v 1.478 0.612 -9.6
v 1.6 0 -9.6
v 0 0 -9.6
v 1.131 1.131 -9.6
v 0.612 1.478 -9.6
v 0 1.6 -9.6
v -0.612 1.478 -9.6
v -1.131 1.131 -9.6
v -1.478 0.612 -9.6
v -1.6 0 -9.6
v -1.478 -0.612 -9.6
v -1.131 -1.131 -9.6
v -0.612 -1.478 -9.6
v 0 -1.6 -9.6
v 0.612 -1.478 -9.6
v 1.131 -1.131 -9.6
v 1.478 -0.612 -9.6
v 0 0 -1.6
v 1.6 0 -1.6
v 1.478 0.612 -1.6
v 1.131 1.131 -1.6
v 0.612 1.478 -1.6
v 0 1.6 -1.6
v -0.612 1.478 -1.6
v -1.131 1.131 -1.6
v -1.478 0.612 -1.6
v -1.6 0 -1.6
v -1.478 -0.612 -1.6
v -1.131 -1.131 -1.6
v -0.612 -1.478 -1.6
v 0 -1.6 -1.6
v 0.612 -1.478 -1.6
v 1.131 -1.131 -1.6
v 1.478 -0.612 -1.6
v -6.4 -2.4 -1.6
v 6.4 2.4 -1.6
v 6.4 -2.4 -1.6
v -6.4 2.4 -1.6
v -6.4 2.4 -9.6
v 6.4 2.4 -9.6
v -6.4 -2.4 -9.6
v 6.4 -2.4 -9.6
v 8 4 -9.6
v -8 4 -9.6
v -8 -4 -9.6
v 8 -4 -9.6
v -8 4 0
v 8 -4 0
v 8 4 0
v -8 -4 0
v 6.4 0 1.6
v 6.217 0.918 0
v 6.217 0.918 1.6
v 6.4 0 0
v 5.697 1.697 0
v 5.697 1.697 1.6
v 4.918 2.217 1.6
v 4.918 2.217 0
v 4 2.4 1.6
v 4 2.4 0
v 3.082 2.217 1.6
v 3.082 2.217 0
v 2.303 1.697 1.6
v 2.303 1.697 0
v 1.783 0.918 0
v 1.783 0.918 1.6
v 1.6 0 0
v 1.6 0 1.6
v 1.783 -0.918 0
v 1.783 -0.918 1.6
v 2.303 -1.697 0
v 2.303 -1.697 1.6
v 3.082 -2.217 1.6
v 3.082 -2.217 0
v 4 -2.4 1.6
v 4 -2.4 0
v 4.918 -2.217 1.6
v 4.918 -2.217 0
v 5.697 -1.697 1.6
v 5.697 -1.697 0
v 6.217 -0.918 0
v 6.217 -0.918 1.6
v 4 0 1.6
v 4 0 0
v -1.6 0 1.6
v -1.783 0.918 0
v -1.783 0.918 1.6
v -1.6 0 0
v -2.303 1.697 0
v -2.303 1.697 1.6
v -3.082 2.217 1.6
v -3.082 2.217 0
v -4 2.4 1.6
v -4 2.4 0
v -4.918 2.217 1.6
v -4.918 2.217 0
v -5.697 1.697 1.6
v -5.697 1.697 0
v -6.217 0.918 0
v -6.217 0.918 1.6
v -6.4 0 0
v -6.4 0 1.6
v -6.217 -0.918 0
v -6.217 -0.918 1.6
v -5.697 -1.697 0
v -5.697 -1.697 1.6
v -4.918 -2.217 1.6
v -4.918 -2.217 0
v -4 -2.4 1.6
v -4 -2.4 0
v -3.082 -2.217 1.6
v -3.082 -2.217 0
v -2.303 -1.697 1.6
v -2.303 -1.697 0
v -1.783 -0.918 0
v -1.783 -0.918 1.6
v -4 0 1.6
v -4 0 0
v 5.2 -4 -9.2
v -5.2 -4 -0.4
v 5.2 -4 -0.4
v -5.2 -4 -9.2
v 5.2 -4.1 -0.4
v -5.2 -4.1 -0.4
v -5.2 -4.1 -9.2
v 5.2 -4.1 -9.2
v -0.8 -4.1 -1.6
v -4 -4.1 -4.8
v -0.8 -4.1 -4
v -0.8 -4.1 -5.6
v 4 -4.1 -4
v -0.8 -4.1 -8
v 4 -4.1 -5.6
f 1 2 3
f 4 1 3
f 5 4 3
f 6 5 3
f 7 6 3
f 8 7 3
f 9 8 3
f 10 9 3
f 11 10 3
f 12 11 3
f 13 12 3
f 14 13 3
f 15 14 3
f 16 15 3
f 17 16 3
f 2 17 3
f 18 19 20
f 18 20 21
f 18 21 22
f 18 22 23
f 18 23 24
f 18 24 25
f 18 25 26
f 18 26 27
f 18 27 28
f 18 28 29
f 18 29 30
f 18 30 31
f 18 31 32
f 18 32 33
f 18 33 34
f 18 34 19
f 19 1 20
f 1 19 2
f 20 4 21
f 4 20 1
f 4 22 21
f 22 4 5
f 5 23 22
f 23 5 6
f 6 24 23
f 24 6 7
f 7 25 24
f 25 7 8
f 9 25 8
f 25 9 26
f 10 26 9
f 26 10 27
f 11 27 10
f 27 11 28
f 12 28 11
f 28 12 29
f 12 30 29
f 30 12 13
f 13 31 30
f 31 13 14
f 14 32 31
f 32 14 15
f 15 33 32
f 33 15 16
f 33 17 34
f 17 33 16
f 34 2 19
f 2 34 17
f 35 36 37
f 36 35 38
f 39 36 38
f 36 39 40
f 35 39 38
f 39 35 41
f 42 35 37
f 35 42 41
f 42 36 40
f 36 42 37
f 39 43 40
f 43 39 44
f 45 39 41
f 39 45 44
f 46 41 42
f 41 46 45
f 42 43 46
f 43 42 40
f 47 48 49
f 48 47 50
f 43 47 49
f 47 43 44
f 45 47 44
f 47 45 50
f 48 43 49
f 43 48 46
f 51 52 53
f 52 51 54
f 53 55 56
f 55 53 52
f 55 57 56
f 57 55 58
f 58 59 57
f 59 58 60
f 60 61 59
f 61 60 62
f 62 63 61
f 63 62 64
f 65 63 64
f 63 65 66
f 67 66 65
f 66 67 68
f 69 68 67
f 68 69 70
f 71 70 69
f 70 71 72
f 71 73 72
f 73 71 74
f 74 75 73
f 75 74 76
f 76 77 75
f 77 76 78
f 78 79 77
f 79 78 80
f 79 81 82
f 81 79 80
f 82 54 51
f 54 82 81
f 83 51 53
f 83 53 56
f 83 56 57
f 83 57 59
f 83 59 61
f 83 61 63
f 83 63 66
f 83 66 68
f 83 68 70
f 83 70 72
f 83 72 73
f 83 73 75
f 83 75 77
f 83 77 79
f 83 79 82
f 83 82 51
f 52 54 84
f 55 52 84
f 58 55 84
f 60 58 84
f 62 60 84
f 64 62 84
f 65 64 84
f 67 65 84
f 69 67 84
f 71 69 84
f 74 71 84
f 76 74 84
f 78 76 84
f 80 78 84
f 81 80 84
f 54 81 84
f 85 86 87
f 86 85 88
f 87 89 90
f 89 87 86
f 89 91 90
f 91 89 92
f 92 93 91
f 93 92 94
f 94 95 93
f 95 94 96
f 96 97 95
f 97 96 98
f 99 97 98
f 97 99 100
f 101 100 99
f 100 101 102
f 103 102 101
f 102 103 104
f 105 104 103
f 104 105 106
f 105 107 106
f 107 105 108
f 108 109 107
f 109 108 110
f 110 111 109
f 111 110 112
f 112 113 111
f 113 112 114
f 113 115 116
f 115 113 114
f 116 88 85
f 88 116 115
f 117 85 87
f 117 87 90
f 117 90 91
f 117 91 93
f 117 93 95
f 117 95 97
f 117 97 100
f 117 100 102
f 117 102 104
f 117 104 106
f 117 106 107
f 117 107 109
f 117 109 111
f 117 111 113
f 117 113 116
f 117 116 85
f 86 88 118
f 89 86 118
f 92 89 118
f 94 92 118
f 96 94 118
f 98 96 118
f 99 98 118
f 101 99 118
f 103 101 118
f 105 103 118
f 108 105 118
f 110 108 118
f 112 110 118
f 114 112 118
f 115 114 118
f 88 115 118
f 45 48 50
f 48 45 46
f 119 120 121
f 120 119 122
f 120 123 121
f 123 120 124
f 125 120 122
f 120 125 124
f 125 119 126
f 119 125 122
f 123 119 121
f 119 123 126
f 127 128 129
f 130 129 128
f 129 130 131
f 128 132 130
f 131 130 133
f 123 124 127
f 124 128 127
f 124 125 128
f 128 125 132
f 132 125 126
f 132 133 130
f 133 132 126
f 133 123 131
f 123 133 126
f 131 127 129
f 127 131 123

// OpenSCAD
// file: ../p/4-4edge.scad
use <../lib.scad>
function ldraw_lib__4_4edge() = [
// 0 Circle 1.0
// 0 Name: 4-4edge.dat
// 0 Author: James Jessiman
// 0 !LDRAW_ORG Primitive UPDATE 2017-01
// 0 !LICENSE Licensed under CC BY 2.0 and CC BY 4.0 : see CAreadme.txt
// 
// 0 BFC CERTIFY CCW
  [0,"BFC","CERTIFY"],
  [0,"BFC","CCW"],
// 
// 0 !HISTORY 1998-12-15 [PTadmin] Official Update 1998-10
// 0 !HISTORY 2005-12-28 [PTadmin] Official Update 2005-01
// 0 !HISTORY 2007-06-24 [PTadmin] Header formatted for Contributor Agreement
// 0 !HISTORY 2008-07-01 [PTadmin] Official Update 2008-01
// 0 !HISTORY 2017-01-15 [Steffen] BFCed
// 0 !HISTORY 2017-12-30 [PTadmin] Official Update 2017-01
// 
// 
// 2 24 1 0 0 0.9239 0 0.3827
  [2,24,1,0,0,0.9239,0,0.3827],
// 2 24 0.9239 0 0.3827 0.7071 0 0.7071
  [2,24,0.9239,0,0.3827,0.7071,0,0.7071],
// 2 24 0.7071 0 0.7071 0.3827 0 0.9239
  [2,24,0.7071,0,0.7071,0.3827,0,0.9239],
// 2 24 0.3827 0 0.9239 0 0 1
  [2,24,0.3827,0,0.9239,0,0,1],
// 2 24 0 0 1 -0.3827 0 0.9239
  [2,24,0,0,1,-0.3827,0,0.9239],
// 2 24 -0.3827 0 0.9239 -0.7071 0 0.7071
  [2,24,-0.3827,0,0.9239,-0.7071,0,0.7071],
// 2 24 -0.7071 0 0.7071 -0.9239 0 0.3827
  [2,24,-0.7071,0,0.7071,-0.9239,0,0.3827],
// 2 24 -0.9239 0 0.3827 -1 0 -0
  [2,24,-0.9239,0,0.3827,-1,0,-0],
// 2 24 -1 0 -0 -0.9239 0 -0.3827
  [2,24,-1,0,-0,-0.9239,0,-0.3827],
// 2 24 -0.9239 0 -0.3827 -0.7071 0 -0.7071
  [2,24,-0.9239,0,-0.3827,-0.7071,0,-0.7071],
// 2 24 -0.7071 0 -0.7071 -0.3827 0 -0.9239
  [2,24,-0.7071,0,-0.7071,-0.3827,0,-0.9239],
// 2 24 -0.3827 0 -0.9239 0 0 -1
  [2,24,-0.3827,0,-0.9239,0,0,-1],
// 2 24 0 0 -1 0.3827 0 -0.9239
  [2,24,0,0,-1,0.3827,0,-0.9239],
// 2 24 0.3827 0 -0.9239 0.7071 0 -0.7071
  [2,24,0.3827,0,-0.9239,0.7071,0,-0.7071],
// 2 24 0.7071 0 -0.7071 0.9239 0 -0.3827
  [2,24,0.7071,0,-0.7071,0.9239,0,-0.3827],
// 2 24 0.9239 0 -0.3827 1 0 0
  [2,24,0.9239,0,-0.3827,1,0,0],
];
module ldraw_lib__4_4edge(step=0, col=false, unit=2/5, alt=false, line=0.2, solid=!$preview)
    makepoly(ldraw_lib__4_4edge(), step=step, col=col, unit=unit, alt=alt, line=line, solid=solid);
ldraw_lib__4_4edge(line=0.2);
// file: ../p/4-4disc.scad
use <../lib.scad>
function ldraw_lib__4_4disc() = [
// 0 Disc 1.0
// 0 Name: 4-4disc.dat
// 0 Author: James Jessiman
// 0 !LDRAW_ORG Primitive UPDATE 2002-02
// 0 !LICENSE Licensed under CC BY 2.0 and CC BY 4.0 : see CAreadme.txt
// 
// 0 BFC CERTIFY CCW
  [0,"BFC","CERTIFY"],
  [0,"BFC","CCW"],
// 
// 0 !HISTORY 1998-12-15 [PTadmin] Official Update 1998-10
// 0 !HISTORY 2002-03-23 [sbliss] Added BFC statement
// 0 !HISTORY 2002-04-25 [PTadmin] Official Update 2002-02
// 0 !HISTORY 2007-06-24 [PTadmin] Header formatted for Contributor Agreement
// 0 !HISTORY 2008-07-01 [PTadmin] Official Update 2008-01
// 
// 
// 3 16 0 0 0 1 0 0 0.9239 0 0.3827
  [3,16,0,0,0,1,0,0,0.9239,0,0.3827],
// 3 16 0 0 0 0.9239 0 0.3827 0.7071 0 0.7071
  [3,16,0,0,0,0.9239,0,0.3827,0.7071,0,0.7071],
// 3 16 0 0 0 0.7071 0 0.7071 0.3827 0 0.9239
  [3,16,0,0,0,0.7071,0,0.7071,0.3827,0,0.9239],
// 3 16 0 0 0 0.3827 0 0.9239 0 0 1
  [3,16,0,0,0,0.3827,0,0.9239,0,0,1],
// 3 16 0 0 0 0 0 1 -0.3827 0 0.9239
  [3,16,0,0,0,0,0,1,-0.3827,0,0.9239],
// 3 16 0 0 0 -0.3827 0 0.9239 -0.7071 0 0.7071
  [3,16,0,0,0,-0.3827,0,0.9239,-0.7071,0,0.7071],
// 3 16 0 0 0 -0.7071 0 0.7071 -0.9239 0 0.3827
  [3,16,0,0,0,-0.7071,0,0.7071,-0.9239,0,0.3827],
// 3 16 0 0 0 -0.9239 0 0.3827 -1 0 -0
  [3,16,0,0,0,-0.9239,0,0.3827,-1,0,-0],
// 3 16 0 0 0 -1 0 -0 -0.9239 0 -0.3827
  [3,16,0,0,0,-1,0,-0,-0.9239,0,-0.3827],
// 3 16 0 0 0 -0.9239 0 -0.3827 -0.7071 0 -0.7071
  [3,16,0,0,0,-0.9239,0,-0.3827,-0.7071,0,-0.7071],
// 3 16 0 0 0 -0.7071 0 -0.7071 -0.3827 0 -0.9239
  [3,16,0,0,0,-0.7071,0,-0.7071,-0.3827,0,-0.9239],
// 3 16 0 0 0 -0.3827 0 -0.9239 0 0 -1
  [3,16,0,0,0,-0.3827,0,-0.9239,0,0,-1],
// 3 16 0 0 0 0 0 -1 0.3827 0 -0.9239
  [3,16,0,0,0,0,0,-1,0.3827,0,-0.9239],
// 3 16 0 0 0 0.3827 0 -0.9239 0.7071 0 -0.7071
  [3,16,0,0,0,0.3827,0,-0.9239,0.7071,0,-0.7071],
// 3 16 0 0 0 0.7071 0 -0.7071 0.9239 0 -0.3827
  [3,16,0,0,0,0.7071,0,-0.7071,0.9239,0,-0.3827],
// 3 16 0 0 0 0.9239 0 -0.3827 1 0 0
  [3,16,0,0,0,0.9239,0,-0.3827,1,0,0],
// 0
];
module ldraw_lib__4_4disc(step=0, col=false, unit=2/5, alt=false, line=0.2, solid=!$preview)
    makepoly(ldraw_lib__4_4disc(), step=step, col=col, unit=unit, alt=alt, line=line, solid=solid);
ldraw_lib__4_4disc(line=0.2);
// file: ../p/4-4cyli.scad
use <../lib.scad>
$fa=1; $fs=0.2;
function ldraw_lib__4_4cyli(realsolid=false) = [
// 0 Cylinder 1.0
// 0 Name: 4-4cyli.dat
// 0 Author: James Jessiman
// 0 !LDRAW_ORG Primitive UPDATE 2005-01
// 0 !LICENSE Licensed under CC BY 2.0 and CC BY 4.0 : see CAreadme.txt
// 
// 0 BFC CERTIFY CCW
  [0,"BFC","CERTIFY"],
  [0,"BFC","CCW"],
// 
// 0 !HISTORY 1998-12-15 [PTadmin] Official Update 1998-10
// 0 !HISTORY 2002-03-23 [sbliss] Added BFC statement; merged headers from files in distributions LDraw 0.27 and Complete.
// 0 !HISTORY 2002-04-25 [PTadmin] Official Update 2002-02
// 0 !HISTORY 2004-12-14 [guyvivan] BFC CCW
// 0 !HISTORY 2005-12-28 [PTadmin] Official Update 2005-01
// 0 !HISTORY 2007-06-24 [PTadmin] Header formatted for Contributor Agreement
// 0 !HISTORY 2008-07-01 [PTadmin] Official Update 2008-01
// 
// 
// 4 16 1 1 0 0.9239 1 0.3827 0.9239 0 0.3827 1 0 0
  [4,16,1,1,0,0.9239,1,0.3827,0.9239,0,0.3827,1,0,0],
// 5 24 1 0 0 1 1 0 0.9239 0 0.3827 0.9239 0 -0.3827
  [5,24,1,0,0,1,1,0,0.9239,0,0.3827,0.9239,0,-0.3827],
// 4 16 0.9239 1 0.3827 0.7071 1 0.7071 0.7071 0 0.7071 0.9239 0 0.3827
  [4,16,0.9239,1,0.3827,0.7071,1,0.7071,0.7071,0,0.7071,0.9239,0,0.3827],
// 5 24 0.9239 0 0.3827 0.9239 1 0.3827 0.7071 0 0.7071 1 0 0
  [5,24,0.9239,0,0.3827,0.9239,1,0.3827,0.7071,0,0.7071,1,0,0],
// 4 16 0.7071 1 0.7071 0.3827 1 0.9239 0.3827 0 0.9239 0.7071 0 0.7071
  [4,16,0.7071,1,0.7071,0.3827,1,0.9239,0.3827,0,0.9239,0.7071,0,0.7071],
// 5 24 0.7071 0 0.7071 0.7071 1 0.7071 0.3827 0 0.9239 0.9239 0 0.3827
  [5,24,0.7071,0,0.7071,0.7071,1,0.7071,0.3827,0,0.9239,0.9239,0,0.3827],
// 4 16 0.3827 1 0.9239 0 1 1 0 0 1 0.3827 0 0.9239
  [4,16,0.3827,1,0.9239,0,1,1,0,0,1,0.3827,0,0.9239],
// 5 24 0.3827 0 0.9239 0.3827 1 0.9239 0 0 1 0.7071 0 0.7071
  [5,24,0.3827,0,0.9239,0.3827,1,0.9239,0,0,1,0.7071,0,0.7071],
// 4 16 0 1 1 -0.3827 1 0.9239 -0.3827 0 0.9239 0 0 1
  [4,16,0,1,1,-0.3827,1,0.9239,-0.3827,0,0.9239,0,0,1],
// 5 24 0 0 1 0 1 1 -0.3827 0 0.9239 0.3827 0 0.9239
  [5,24,0,0,1,0,1,1,-0.3827,0,0.9239,0.3827,0,0.9239],
// 4 16 -0.3827 1 0.9239 -0.7071 1 0.7071 -0.7071 0 0.7071 -0.3827 0 0.9239
  [4,16,-0.3827,1,0.9239,-0.7071,1,0.7071,-0.7071,0,0.7071,-0.3827,0,0.9239],
// 5 24 -0.3827 0 0.9239 -0.3827 1 0.9239 -0.7071 0 0.7071 0 0 1
  [5,24,-0.3827,0,0.9239,-0.3827,1,0.9239,-0.7071,0,0.7071,0,0,1],
// 4 16 -0.7071 1 0.7071 -0.9239 1 0.3827 -0.9239 0 0.3827 -0.7071 0 0.7071
  [4,16,-0.7071,1,0.7071,-0.9239,1,0.3827,-0.9239,0,0.3827,-0.7071,0,0.7071],
// 5 24 -0.7071 0 0.7071 -0.7071 1 0.7071 -0.9239 0 0.3827 -0.3827 0 0.9239
  [5,24,-0.7071,0,0.7071,-0.7071,1,0.7071,-0.9239,0,0.3827,-0.3827,0,0.9239],
// 4 16 -0.9239 1 0.3827 -1 1 0 -1 0 0 -0.9239 0 0.3827
  [4,16,-0.9239,1,0.3827,-1,1,0,-1,0,0,-0.9239,0,0.3827],
// 5 24 -0.9239 0 0.3827 -0.9239 1 0.3827 -1 0 0 -0.7071 0 0.7071
  [5,24,-0.9239,0,0.3827,-0.9239,1,0.3827,-1,0,0,-0.7071,0,0.7071],
// 4 16 -1 1 0 -0.9239 1 -0.3827 -0.9239 0 -0.3827 -1 0 0
  [4,16,-1,1,0,-0.9239,1,-0.3827,-0.9239,0,-0.3827,-1,0,0],
// 5 24 -1 0 0 -1 1 0 -0.9239 0 -0.3827 -0.9239 0 0.3827
  [5,24,-1,0,0,-1,1,0,-0.9239,0,-0.3827,-0.9239,0,0.3827],
// 4 16 -0.9239 1 -0.3827 -0.7071 1 -0.7071 -0.7071 0 -0.7071 -0.9239 0 -0.3827
  [4,16,-0.9239,1,-0.3827,-0.7071,1,-0.7071,-0.7071,0,-0.7071,-0.9239,0,-0.3827],
// 5 24 -0.9239 0 -0.3827 -0.9239 1 -0.3827 -0.7071 0 -0.7071 -1 0 0
  [5,24,-0.9239,0,-0.3827,-0.9239,1,-0.3827,-0.7071,0,-0.7071,-1,0,0],
// 4 16 -0.7071 1 -0.7071 -0.3827 1 -0.9239 -0.3827 0 -0.9239 -0.7071 0 -0.7071
  [4,16,-0.7071,1,-0.7071,-0.3827,1,-0.9239,-0.3827,0,-0.9239,-0.7071,0,-0.7071],
// 5 24 -0.7071 0 -0.7071 -0.7071 1 -0.7071 -0.3827 0 -0.9239 -0.9239 0 -0.3827
  [5,24,-0.7071,0,-0.7071,-0.7071,1,-0.7071,-0.3827,0,-0.9239,-0.9239,0,-0.3827],
// 4 16 -0.3827 1 -0.9239 0 1 -1 0 0 -1 -0.3827 0 -0.9239
  [4,16,-0.3827,1,-0.9239,0,1,-1,0,0,-1,-0.3827,0,-0.9239],
// 5 24 -0.3827 0 -0.9239 -0.3827 1 -0.9239 0 0 -1 -0.7071 0 -0.7071
  [5,24,-0.3827,0,-0.9239,-0.3827,1,-0.9239,0,0,-1,-0.7071,0,-0.7071],
// 4 16 0 1 -1 0.3827 1 -0.9239 0.3827 0 -0.9239 0 0 -1
  [4,16,0,1,-1,0.3827,1,-0.9239,0.3827,0,-0.9239,0,0,-1],
// 5 24 0 0 -1 0 1 -1 0.3827 0 -0.9239 -0.3827 0 -0.9239
  [5,24,0,0,-1,0,1,-1,0.3827,0,-0.9239,-0.3827,0,-0.9239],
// 4 16 0.3827 1 -0.9239 0.7071 1 -0.7071 0.7071 0 -0.7071 0.3827 0 -0.9239
  [4,16,0.3827,1,-0.9239,0.7071,1,-0.7071,0.7071,0,-0.7071,0.3827,0,-0.9239],
// 5 24 0.3827 0 -0.9239 0.3827 1 -0.9239 0.7071 0 -0.7071 0 0 -1
  [5,24,0.3827,0,-0.9239,0.3827,1,-0.9239,0.7071,0,-0.7071,0,0,-1],
// 4 16 0.7071 1 -0.7071 0.9239 1 -0.3827 0.9239 0 -0.3827 0.7071 0 -0.7071
  [4,16,0.7071,1,-0.7071,0.9239,1,-0.3827,0.9239,0,-0.3827,0.7071,0,-0.7071],
// 5 24 0.7071 0 -0.7071 0.7071 1 -0.7071 0.9239 0 -0.3827 0.3827 0 -0.9239
  [5,24,0.7071,0,-0.7071,0.7071,1,-0.7071,0.9239,0,-0.3827,0.3827,0,-0.9239],
// 4 16 0.9239 1 -0.3827 1 1 0 1 0 0 0.9239 0 -0.3827
  [4,16,0.9239,1,-0.3827,1,1,0,1,0,0,0.9239,0,-0.3827],
// 5 24 0.9239 0 -0.3827 0.9239 1 -0.3827 1 0 0 0.7071 0 -0.7071
  [5,24,0.9239,0,-0.3827,0.9239,1,-0.3827,1,0,0,0.7071,0,-0.7071],
// 0
];
module ldraw_lib__4_4cyli(step=0, col=false, unit=2/5, alt=false, line=0.2, solid=!$preview)
    makepoly(ldraw_lib__4_4cyli(solid), step=step, col=col, unit=unit, alt=alt, line=line, solid=solid);
ldraw_lib__4_4cyli(line=0.2);
// file: ../p/stud3.scad
use <../lib.scad>
use <4-4cyli.scad>
use <4-4disc.scad>
use <4-4edge.scad>
function ldraw_lib__stud3() = [
// 0 Stud Tube Solid
// 0 Name: stud3.dat
// 0 Author: James Jessiman
// 0 !LDRAW_ORG Primitive UPDATE 2012-01
// 0 !LICENSE Licensed under CC BY 4.0 : see CAreadme.txt
// 
// 0 BFC CERTIFY CCW
  [0,"BFC","CERTIFY"],
  [0,"BFC","CCW"],
// 
// 0 !HISTORY 2002-04-04 [sbliss] Modified for BFC compliance
// 0 !HISTORY 2002-04-25 [PTadmin] Official Update 2002-02
// 0 !HISTORY 2007-06-24 [PTadmin] Header formatted for Contributor Agreement
// 0 !HISTORY 2008-07-01 [PTadmin] Official Update 2008-01
// 0 !HISTORY 2012-02-16 [Philo] Changed to CCW
// 0 !HISTORY 2012-03-30 [PTadmin] Official Update 2012-01
// 
// 
// 1 16 0 -4 0 4 0 0 0 1 0 0 0 4 4-4edge.dat
  [1,16,0,-4,0,4,0,0,0,1,0,0,0,4, ldraw_lib__4_4edge()],
// 1 16 0 0 0 4 0 0 0 1 0 0 0 4 4-4edge.dat
  [1,16,0,0,0,4,0,0,0,1,0,0,0,4, ldraw_lib__4_4edge()],
// 1 16 0 -4 0 4 0 0 0 1 0 0 0 4 4-4disc.dat
  [1,16,0,-4,0,4,0,0,0,1,0,0,0,4, ldraw_lib__4_4disc()],
  [-1,16,0,0,0,4,0,0,0,-1,0,0,0,4, ldraw_lib__4_4disc()],
// 1 16 0 -4 0 4 0 0 0 4 0 0 0 4 4-4cyli.dat
  [1,16,0,-4,0,4,0,0,0,4,0,0,0,4, ldraw_lib__4_4cyli()],
];
module ldraw_lib__stud3(step=0, col=false, unit=2/5, alt=false, line=0.2, solid=!$preview)
    makepoly(ldraw_lib__stud3(), step=step, col=col, unit=unit, alt=alt, line=line, solid=solid);
ldraw_lib__stud3(line=0.2);
// file: ../p/stud.scad
use <../lib.scad>
use <4-4cyli.scad>
use <4-4disc.scad>
use <4-4edge.scad>
function ldraw_lib__stud() = [
// 0 Stud
// 0 Name: stud.dat
// 0 Author: James Jessiman
// 0 !LDRAW_ORG Primitive UPDATE 2012-01
// 0 !LICENSE Licensed under CC BY 4.0 : see CAreadme.txt
// 
// 0 BFC CERTIFY CCW
  [0,"BFC","CERTIFY"],
  [0,"BFC","CCW"],
// 
// 0 !HISTORY 2002-04-04 [sbliss] Modified for BFC compliance
// 0 !HISTORY 2002-04-25 [PTadmin] Official Update 2002-02
// 0 !HISTORY 2007-06-24 [PTadmin] Header formatted for Contributor Agreement
// 0 !HISTORY 2008-07-01 [PTadmin] Official Update 2008-01
// 0 !HISTORY 2012-02-16 [Philo] Changed to CCW
// 0 !HISTORY 2012-03-30 [PTadmin] Official Update 2012-01
// 
// 
// 1 16 0 0 0 6 0 0 0 1 0 0 0 6 4-4edge.dat
  [1,16,0,0,0,6,0,0,0,1,0,0,0,6, ldraw_lib__4_4edge()],
// 1 16 0 -4 0 6 0 0 0 1 0 0 0 6 4-4edge.dat
  [1,16,0,-4,0,6,0,0,0,1,0,0,0,6, ldraw_lib__4_4edge()],
// 1 16 0 0 0 6 0 0 0 -4 0 0 0 6 4-4cyli.dat
  [1,16,0,0,0,6,0,0,0,-4,0,0,0,6, ldraw_lib__4_4cyli()],
// 1 16 0 -4 0 6 0 0 0 1 0 0 0 6 4-4disc.dat
  [1,16,0,-4,0,6,0,0,0,1,0,0,0,6, ldraw_lib__4_4disc()],
  [-1,16,0,0,0,6,0,0,0,-1,0,0,0,6, ldraw_lib__4_4disc()],
];
module ldraw_lib__stud(step=0, col=false, unit=2/5, alt=false, line=0.2, solid=!$preview)
    makepoly(ldraw_lib__stud(), step=step, col=col, unit=unit, alt=alt, line=line, solid=solid);
ldraw_lib__stud(line=0.2);
// file: ../p/box5.scad
use <../lib.scad>
function ldraw_lib__box5() = [
// 0 Box with 5 Faces and All Edges
// 0 Name: box5.dat
// 0 Author: James Jessiman
// 0 !LDRAW_ORG Primitive UPDATE 2012-01
// 0 !LICENSE Licensed under CC BY 2.0 and CC BY 4.0 : see CAreadme.txt
// 
// 0 BFC CERTIFY CCW
  [0,"BFC","CERTIFY"],
  [0,"BFC","CCW"],
// 
// 0 !HISTORY 2002-04-03 [sbliss] Modified for BFC compliance
// 0 !HISTORY 2002-04-25 [PTadmin] Official Update 2002-02
// 0 !HISTORY 2007-06-24 [PTadmin] Header formatted for Contributor Agreement
// 0 !HISTORY 2008-07-01 [PTadmin] Official Update 2008-01
// 0 !HISTORY 2012-02-16 [Philo] Changed to CCW
// 0 !HISTORY 2012-03-30 [PTadmin] Official Update 2012-01
// 
// 
// 2 24 1 1 1 -1 1 1
  [2,24,1,1,1,-1,1,1],
// 2 24 -1 1 1 -1 1 -1
  [2,24,-1,1,1,-1,1,-1],
// 2 24 -1 1 -1 1 1 -1
  [2,24,-1,1,-1,1,1,-1],
// 2 24 1 1 -1 1 1 1
  [2,24,1,1,-1,1,1,1],
// 2 24 1 0 1 -1 0 1
  [2,24,1,0,1,-1,0,1],
// 2 24 -1 0 1 -1 0 -1
  [2,24,-1,0,1,-1,0,-1],
// 2 24 -1 0 -1 1 0 -1
  [2,24,-1,0,-1,1,0,-1],
// 2 24 1 0 -1 1 0 1
  [2,24,1,0,-1,1,0,1],
// 2 24 1 0 1 1 1 1
  [2,24,1,0,1,1,1,1],
// 2 24 -1 0 1 -1 1 1
  [2,24,-1,0,1,-1,1,1],
// 2 24 1 0 -1 1 1 -1
  [2,24,1,0,-1,1,1,-1],
// 2 24 -1 0 -1 -1 1 -1
  [2,24,-1,0,-1,-1,1,-1],
// 4 16 -1 1 1 1 1 1 1 1 -1 -1 1 -1
  [4,16,-1,1,1,1,1,1,1,1,-1,-1,1,-1],
// 4 16 -1 1 1 -1 0 1 1 0 1 1 1 1
  [4,16,-1,1,1,-1,0,1,1,0,1,1,1,1],
// 4 16 -1 1 -1 -1 0 -1 -1 0 1 -1 1 1
  [4,16,-1,1,-1,-1,0,-1,-1,0,1,-1,1,1],
// 4 16 1 1 -1 1 0 -1 -1 0 -1 -1 1 -1
  [4,16,1,1,-1,1,0,-1,-1,0,-1,-1,1,-1],
// 4 16 1 1 1 1 0 1 1 0 -1 1 1 -1
  [4,16,1,1,1,1,0,1,1,0,-1,1,1,-1],
];
makepoly(ldraw_lib__box5(), line=0.2);
// file: ../p/box4t.scad
use <../lib.scad>
function ldraw_lib__box4t() = [
// 0 Box with 4 Adjacent Faces and All Edges
// 0 Name: box4t.dat
// 0 Author: Tore Eriksson [Tore_Eriksson]
// 0 !LDRAW_ORG Primitive UPDATE 2003-02
// 0 !LICENSE Licensed under CC BY 2.0 and CC BY 4.0 : see CAreadme.txt
// 
// 0 BFC CERTIFY CCW
  [0,"BFC","CERTIFY"],
  [0,"BFC","CCW"],
// 
// 0 !HISTORY 1997-09-29 [PTadmin] Official Update 1997-15
// 0 !HISTORY 2002-08-31 [izanette] Modified with WINDZ for BFC compliance
// 0 !HISTORY 2003-08-01 [PTadmin] Official Update 2003-02
// 0 !HISTORY 2007-06-24 [PTadmin] Header formatted for Contributor Agreement
// 0 !HISTORY 2008-07-01 [PTadmin] Official Update 2008-01
// 
// 
// 2 24 1 1 1 -1 1 1
  [2,24,1,1,1,-1,1,1],
// 2 24 -1 1 1 -1 1 -1
  [2,24,-1,1,1,-1,1,-1],
// 2 24 -1 1 -1 1 1 -1
  [2,24,-1,1,-1,1,1,-1],
// 2 24 1 1 -1 1 1 1
  [2,24,1,1,-1,1,1,1],
// 2 24 1 0 1 -1 0 1
  [2,24,1,0,1,-1,0,1],
// 2 24 -1 0 1 -1 0 -1
  [2,24,-1,0,1,-1,0,-1],
// 2 24 -1 0 -1 1 0 -1
  [2,24,-1,0,-1,1,0,-1],
// 2 24 1 0 -1 1 0 1
  [2,24,1,0,-1,1,0,1],
// 2 24 1 0 1 1 1 1
  [2,24,1,0,1,1,1,1],
// 2 24 -1 0 1 -1 1 1
  [2,24,-1,0,1,-1,1,1],
// 2 24 1 0 -1 1 1 -1
  [2,24,1,0,-1,1,1,-1],
// 2 24 -1 0 -1 -1 1 -1
  [2,24,-1,0,-1,-1,1,-1],
// 4 16 1 1 1 1 1 -1 -1 1 -1 -1 1 1
  [4,16,1,1,1,1,1,-1,-1,1,-1,-1,1,1],
// 4 16 1 1 1 -1 1 1 -1 0 1 1 0 1
  [4,16,1,1,1,-1,1,1,-1,0,1,1,0,1],
// 4 16 -1 1 1 -1 1 -1 -1 0 -1 -1 0 1
  [4,16,-1,1,1,-1,1,-1,-1,0,-1,-1,0,1],
// 0 4 16 -1 1 -1 -1 0 -1 1 0 -1 1 1 -1
// 4 16 1 1 -1 1 1 1 1 0 1 1 0 -1
  [4,16,1,1,-1,1,1,1,1,0,1,1,0,-1],
// 0
];
makepoly(ldraw_lib__box4t(), line=0.2);
// file: s/3004s01.scad
use <../../lib.scad>
use <../../p/box4t.scad>
use <../../p/box5.scad>
use <../../p/stud.scad>
use <../../p/stud3.scad>
$fa=1; $fs=0.2;
function ldraw_lib__s__3004s01(realsolid=false) = [
// 0 ~Brick  1 x  2 without Front Face
// 0 Name: s\3004s01.dat
// 0 Author: James Jessiman
// 0 !LDRAW_ORG Subpart UPDATE 2003-03
// 0 !LICENSE Licensed under CC BY 2.0 and CC BY 4.0 : see CAreadme.txt
// 
// 0 BFC CERTIFY CCW
  [0,"BFC","CERTIFY"],
  [0,"BFC","CCW"],
// 
// 0 !HISTORY 2003-09-07 [jriley] Subfiling, BFC
// 0 !HISTORY 2003-12-19 [PTadmin] Official Update 2003-03
// 0 !HISTORY 2007-08-29 [PTadmin] Header formatted for Contributor Agreement
// 0 !HISTORY 2008-07-01 [PTadmin] Official Update 2008-01
// 
// 
// 1 16 0 4 0 1 0 0 0 -5 0 0 0 1 stud3.dat
  [1,16,0,4,0,1,0,0,0,-5,0,0,0,1, ldraw_lib__stud3(realsolid)],
// 0 BFC INVERTNEXT
  [0,"BFC","INVERTNEXT"],
// 1 16 0 24 0 16 0 0 0 -20 0 0 0 6 box5.dat
  [1,16,0,24,0,16,0,0,0,-20,0,0,0,6, ldraw_lib__box5(realsolid)],
// 4 16 20 24 10 16 24 6 -16 24 6 -20 24 10
  [4,16,20,24,10,16,24,6,-16,24,6,-20,24,10],
// 4 16 -20 24 10 -16 24 6 -16 24 -6 -20 24 -10
  [4,16,-20,24,10,-16,24,6,-16,24,-6,-20,24,-10],
// 4 16 -20 24 -10 -16 24 -6 16 24 -6 20 24 -10
  [4,16,-20,24,-10,-16,24,-6,16,24,-6,20,24,-10],
// 4 16 20 24 -10 16 24 -6 16 24 6 20 24 10
  [4,16,20,24,-10,16,24,-6,16,24,6,20,24,10],
// 1 16 0 24 0 20 0 0 0 -24 0 0 0 10 box4t.dat
  [1,16,0,24,0,20,0,0,0,-24,0,0,0,10, ldraw_lib__box4t(realsolid)],
// 1 16 10 0 0 1 0 0 0 1 0 0 0 1 stud.dat
  [1,16,10,0,0,1,0,0,0,1,0,0,0,1, ldraw_lib__stud(realsolid)],
// 1 16 -10 0 0 1 0 0 0 1 0 0 0 1 stud.dat
  [1,16,-10,0,0,1,0,0,0,1,0,0,0,1, ldraw_lib__stud(realsolid)],
// 0
];
module ldraw_lib__s__3004s01(step=0, col=false, unit=2/5, alt=false, line=0.2, solid=!$preview)
    makepoly(ldraw_lib__s__3004s01(solid), step=step, col=col, unit=unit, alt=alt, line=line, solid=solid);
ldraw_lib__s__3004s01(line=0.2);
// file: ../p/box5-12.scad
use <../lib.scad>
function ldraw_lib__box5_12() = [
// 0 Box with 5 Faces without Any Edges
// 0 Name: box5-12.dat
// 0 Author: Chris Dee [cwdee]
// 0 !LDRAW_ORG Primitive UPDATE 2009-02
// 0 !LICENSE Licensed under CC BY 2.0 and CC BY 4.0 : see CAreadme.txt
// 
// 0 BFC CERTIFY CCW
  [0,"BFC","CERTIFY"],
  [0,"BFC","CCW"],
// 
// 0 !HISTORY 2009-09-03 [PTadmin] Official Update 2009-02
// 
// 
// 4 16 1 1 1 1 1 -1 -1 1 -1 -1 1 1
  [4,16,1,1,1,1,1,-1,-1,1,-1,-1,1,1],
// 4 16 -1 0 1 1 0 1 1 1 1 -1 1 1
  [4,16,-1,0,1,1,0,1,1,1,1,-1,1,1],
// 4 16 -1 0 -1 -1 0 1 -1 1 1 -1 1 -1
  [4,16,-1,0,-1,-1,0,1,-1,1,1,-1,1,-1],
// 4 16 1 0 -1 -1 0 -1 -1 1 -1 1 1 -1
  [4,16,1,0,-1,-1,0,-1,-1,1,-1,1,1,-1],
// 4 16 1 0 1 1 0 -1 1 1 -1 1 1 1
  [4,16,1,0,1,1,0,-1,1,1,-1,1,1,1],
// 0
];
module ldraw_lib__box5_12(step=0, col=false, unit=2/5, alt=false, line=0.2, solid=!$preview)
    makepoly(ldraw_lib__box5_12(), step=step, col=col, unit=unit, alt=alt, line=line, solid=solid);
ldraw_lib__box5_12(line=0.2);
// file: 3004.scad
use <../lib.scad>
use <s/3004s01.scad>
function ldraw_lib__3004() = [
// 0 Brick  1 x  2
// 0 Name: 3004.dat
// 0 Author: James Jessiman
// 0 !LDRAW_ORG Part UPDATE 2022-05
// 0 !LICENSE Licensed under CC BY 2.0 and CC BY 4.0 : see CAreadme.txt
// 
// 0 BFC CERTIFY CCW
  [0,"BFC","CERTIFY"],
  [0,"BFC","CCW"],
// 
// 0 !HISTORY 2001-10-26 [PTadmin] Official Update 2001-01
// 0 !HISTORY 2002-05-07 {unknown} BFC Certification
// 0 !HISTORY 2002-06-11 [PTadmin] Official Update 2002-03
// 0 !HISTORY 2007-05-07 [PTadmin] Header formatted for Contributor Agreement
// 0 !HISTORY 2008-07-01 [PTadmin] Official Update 2008-01
// 0 !HISTORY 2022-08-04 [MagFors] Using subfile
// 0 !HISTORY 2022-09-15 [PTadmin] Official Update 2022-05
// 
// 
// 1 16 0 0 0 1 0 0 0 1 0 0 0 1 s\3004s01.dat
  [1,16,0,0,0,1,0,0,0,1,0,0,0,1, ldraw_lib__s__3004s01()],
// 4 16 -20 24 -10 20 24 -10 20 0 -10 -20 0 -10
  [4,16,-20,24,-10,20,24,-10,20,0,-10,-20,0,-10],
];
module ldraw_lib__3004(step=0, col=false, unit=2/5, alt=false, line=0.2, solid=!$preview)
    makepoly(ldraw_lib__3004(), step=step, col=col, unit=unit, alt=alt, line=line, solid=solid);
ldraw_lib__3004(line=0.2);
// file: 190295b.scad
use <../lib.scad>
use <../p/box5-12.scad>
$fa=1; $fs=0.2;
function ldraw_lib__190295b(realsolid=false) = [
// 0 Sticker  1.1 x  1.3 with Black Left Arrow
// 0 Name: 190295b.dat
// 0 Author: Takeshi Takahashi [RainbowDolphin]
// 0 !LDRAW_ORG Part UPDATE 2022-01
// 0 !LICENSE Licensed under CC BY 2.0 and CC BY 4.0 : see CAreadme.txt
// 
// 0 BFC CERTIFY CCW
  [0,"BFC","CERTIFY"],
  [0,"BFC","CCW"],
// 
// 0 !KEYWORDS bus station, Set 379-1
// 
// 0 !HISTORY 2022-01-14 [PTadmin] Official Update 2022-01
// 
// 
// 1 16 0 -0.25 0 13 0 0 0 0.25 0 0 0 11 box5-12.dat
  [1,16,0,-0.25,0,13,0,0,0,0.25,0,0,0,11, ldraw_lib__box5_12(realsolid)],
// 3 0 -2 -0.25 8 -10 -0.25 0 -2 -0.25 2
  [3,0,-2,-0.25,8,-10,-0.25,0,-2,-0.25,2],
// 4 0 -2 -0.25 2 -10 -0.25 0 -2 -0.25 -2 10 -0.25 2
  [4,0,-2,-0.25,2,-10,-0.25,0,-2,-0.25,-2,10,-0.25,2],
// 3 0 -10 -0.25 0 -2 -0.25 -8 -2 -0.25 -2
  [3,0,-10,-0.25,0,-2,-0.25,-8,-2,-0.25,-2],
// 3 0 10 -0.25 2 -2 -0.25 -2 10 -0.25 -2
  [3,0,10,-0.25,2,-2,-0.25,-2,10,-0.25,-2],
// 3 15 13 -0.25 11 -13 -0.25 11 -2 -0.25 8
  [3,15,13,-0.25,11,-13,-0.25,11,-2,-0.25,8],
// 3 15 -13 -0.25 11 -10 -0.25 0 -2 -0.25 8
  [3,15,-13,-0.25,11,-10,-0.25,0,-2,-0.25,8],
// 3 15 -13 -0.25 11 -13 -0.25 -11 -10 -0.25 0
  [3,15,-13,-0.25,11,-13,-0.25,-11,-10,-0.25,0],
// 3 15 -10 -0.25 0 -13 -0.25 -11 -2 -0.25 -8
  [3,15,-10,-0.25,0,-13,-0.25,-11,-2,-0.25,-8],
// 3 15 -2 -0.25 -8 -13 -0.25 -11 13 -0.25 -11
  [3,15,-2,-0.25,-8,-13,-0.25,-11,13,-0.25,-11],
// 4 15 -2 -0.25 -8 13 -0.25 -11 10 -0.25 -2 -2 -0.25 -2
  [4,15,-2,-0.25,-8,13,-0.25,-11,10,-0.25,-2,-2,-0.25,-2],
// 4 15 10 -0.25 2 10 -0.25 -2 13 -0.25 -11 13 -0.25 11
  [4,15,10,-0.25,2,10,-0.25,-2,13,-0.25,-11,13,-0.25,11],
// 4 15 10 -0.25 2 13 -0.25 11 -2 -0.25 8 -2 -0.25 2
  [4,15,10,-0.25,2,13,-0.25,11,-2,-0.25,8,-2,-0.25,2],
];
module ldraw_lib__190295b(step=0, col=false, unit=2/5, alt=false, line=0.2, solid=!$preview)
    makepoly(ldraw_lib__190295b(solid), step=step, col=col, unit=unit, alt=alt, line=line, solid=solid);
ldraw_lib__190295b(line=0.2);
// main file
use <../lib.scad>
use <190295b.scad>
use <3004.scad>
function ldraw_lib__3004d0e() = [
// 0 Brick  1 x  2 with Black Left Arrow Sticker
// 0 Name: 3004d0e.dat
// 0 Author: Takeshi Takahashi [RainbowDolphin]
// 0 !LDRAW_ORG Shortcut UPDATE 2024-05
// 0 !LICENSE Licensed under CC BY 4.0 : see CAreadme.txt
// 
// 0 BFC CERTIFY CCW
  [0,"BFC","CERTIFY"],
  [0,"BFC","CCW"],
// 
// 0 !CATEGORY Sticker Shortcut
// 0 !KEYWORDS Bricklink 3004pb055, bus station, Set 379-1
// 
// 0 !HISTORY 2024-06-30 [OrionP] Official Update 2024-05
// 
// 1 16 0 0 0 1 0 0 0 1 0 0 0 1 3004.dat
  [1,16,0,0,0,1,0,0,0,1,0,0,0,1, ldraw_lib__3004()],
// 1 16 0 12 -10 1 0 0 0 0 -1 0 1 0 190295b.dat
  [1,16,0,12,-10,1,0,0,0,0,-1,0,1,0, ldraw_lib__190295b()],
];
module ldraw_lib__3004d0e(step=0, col=false, unit=2/5, alt=false, line=0.2, solid=!$preview)
    makepoly(ldraw_lib__3004d0e(), step=step, col=col, unit=unit, alt=alt, line=line, solid=solid);
ldraw_lib__3004d0e(line=0.2);
